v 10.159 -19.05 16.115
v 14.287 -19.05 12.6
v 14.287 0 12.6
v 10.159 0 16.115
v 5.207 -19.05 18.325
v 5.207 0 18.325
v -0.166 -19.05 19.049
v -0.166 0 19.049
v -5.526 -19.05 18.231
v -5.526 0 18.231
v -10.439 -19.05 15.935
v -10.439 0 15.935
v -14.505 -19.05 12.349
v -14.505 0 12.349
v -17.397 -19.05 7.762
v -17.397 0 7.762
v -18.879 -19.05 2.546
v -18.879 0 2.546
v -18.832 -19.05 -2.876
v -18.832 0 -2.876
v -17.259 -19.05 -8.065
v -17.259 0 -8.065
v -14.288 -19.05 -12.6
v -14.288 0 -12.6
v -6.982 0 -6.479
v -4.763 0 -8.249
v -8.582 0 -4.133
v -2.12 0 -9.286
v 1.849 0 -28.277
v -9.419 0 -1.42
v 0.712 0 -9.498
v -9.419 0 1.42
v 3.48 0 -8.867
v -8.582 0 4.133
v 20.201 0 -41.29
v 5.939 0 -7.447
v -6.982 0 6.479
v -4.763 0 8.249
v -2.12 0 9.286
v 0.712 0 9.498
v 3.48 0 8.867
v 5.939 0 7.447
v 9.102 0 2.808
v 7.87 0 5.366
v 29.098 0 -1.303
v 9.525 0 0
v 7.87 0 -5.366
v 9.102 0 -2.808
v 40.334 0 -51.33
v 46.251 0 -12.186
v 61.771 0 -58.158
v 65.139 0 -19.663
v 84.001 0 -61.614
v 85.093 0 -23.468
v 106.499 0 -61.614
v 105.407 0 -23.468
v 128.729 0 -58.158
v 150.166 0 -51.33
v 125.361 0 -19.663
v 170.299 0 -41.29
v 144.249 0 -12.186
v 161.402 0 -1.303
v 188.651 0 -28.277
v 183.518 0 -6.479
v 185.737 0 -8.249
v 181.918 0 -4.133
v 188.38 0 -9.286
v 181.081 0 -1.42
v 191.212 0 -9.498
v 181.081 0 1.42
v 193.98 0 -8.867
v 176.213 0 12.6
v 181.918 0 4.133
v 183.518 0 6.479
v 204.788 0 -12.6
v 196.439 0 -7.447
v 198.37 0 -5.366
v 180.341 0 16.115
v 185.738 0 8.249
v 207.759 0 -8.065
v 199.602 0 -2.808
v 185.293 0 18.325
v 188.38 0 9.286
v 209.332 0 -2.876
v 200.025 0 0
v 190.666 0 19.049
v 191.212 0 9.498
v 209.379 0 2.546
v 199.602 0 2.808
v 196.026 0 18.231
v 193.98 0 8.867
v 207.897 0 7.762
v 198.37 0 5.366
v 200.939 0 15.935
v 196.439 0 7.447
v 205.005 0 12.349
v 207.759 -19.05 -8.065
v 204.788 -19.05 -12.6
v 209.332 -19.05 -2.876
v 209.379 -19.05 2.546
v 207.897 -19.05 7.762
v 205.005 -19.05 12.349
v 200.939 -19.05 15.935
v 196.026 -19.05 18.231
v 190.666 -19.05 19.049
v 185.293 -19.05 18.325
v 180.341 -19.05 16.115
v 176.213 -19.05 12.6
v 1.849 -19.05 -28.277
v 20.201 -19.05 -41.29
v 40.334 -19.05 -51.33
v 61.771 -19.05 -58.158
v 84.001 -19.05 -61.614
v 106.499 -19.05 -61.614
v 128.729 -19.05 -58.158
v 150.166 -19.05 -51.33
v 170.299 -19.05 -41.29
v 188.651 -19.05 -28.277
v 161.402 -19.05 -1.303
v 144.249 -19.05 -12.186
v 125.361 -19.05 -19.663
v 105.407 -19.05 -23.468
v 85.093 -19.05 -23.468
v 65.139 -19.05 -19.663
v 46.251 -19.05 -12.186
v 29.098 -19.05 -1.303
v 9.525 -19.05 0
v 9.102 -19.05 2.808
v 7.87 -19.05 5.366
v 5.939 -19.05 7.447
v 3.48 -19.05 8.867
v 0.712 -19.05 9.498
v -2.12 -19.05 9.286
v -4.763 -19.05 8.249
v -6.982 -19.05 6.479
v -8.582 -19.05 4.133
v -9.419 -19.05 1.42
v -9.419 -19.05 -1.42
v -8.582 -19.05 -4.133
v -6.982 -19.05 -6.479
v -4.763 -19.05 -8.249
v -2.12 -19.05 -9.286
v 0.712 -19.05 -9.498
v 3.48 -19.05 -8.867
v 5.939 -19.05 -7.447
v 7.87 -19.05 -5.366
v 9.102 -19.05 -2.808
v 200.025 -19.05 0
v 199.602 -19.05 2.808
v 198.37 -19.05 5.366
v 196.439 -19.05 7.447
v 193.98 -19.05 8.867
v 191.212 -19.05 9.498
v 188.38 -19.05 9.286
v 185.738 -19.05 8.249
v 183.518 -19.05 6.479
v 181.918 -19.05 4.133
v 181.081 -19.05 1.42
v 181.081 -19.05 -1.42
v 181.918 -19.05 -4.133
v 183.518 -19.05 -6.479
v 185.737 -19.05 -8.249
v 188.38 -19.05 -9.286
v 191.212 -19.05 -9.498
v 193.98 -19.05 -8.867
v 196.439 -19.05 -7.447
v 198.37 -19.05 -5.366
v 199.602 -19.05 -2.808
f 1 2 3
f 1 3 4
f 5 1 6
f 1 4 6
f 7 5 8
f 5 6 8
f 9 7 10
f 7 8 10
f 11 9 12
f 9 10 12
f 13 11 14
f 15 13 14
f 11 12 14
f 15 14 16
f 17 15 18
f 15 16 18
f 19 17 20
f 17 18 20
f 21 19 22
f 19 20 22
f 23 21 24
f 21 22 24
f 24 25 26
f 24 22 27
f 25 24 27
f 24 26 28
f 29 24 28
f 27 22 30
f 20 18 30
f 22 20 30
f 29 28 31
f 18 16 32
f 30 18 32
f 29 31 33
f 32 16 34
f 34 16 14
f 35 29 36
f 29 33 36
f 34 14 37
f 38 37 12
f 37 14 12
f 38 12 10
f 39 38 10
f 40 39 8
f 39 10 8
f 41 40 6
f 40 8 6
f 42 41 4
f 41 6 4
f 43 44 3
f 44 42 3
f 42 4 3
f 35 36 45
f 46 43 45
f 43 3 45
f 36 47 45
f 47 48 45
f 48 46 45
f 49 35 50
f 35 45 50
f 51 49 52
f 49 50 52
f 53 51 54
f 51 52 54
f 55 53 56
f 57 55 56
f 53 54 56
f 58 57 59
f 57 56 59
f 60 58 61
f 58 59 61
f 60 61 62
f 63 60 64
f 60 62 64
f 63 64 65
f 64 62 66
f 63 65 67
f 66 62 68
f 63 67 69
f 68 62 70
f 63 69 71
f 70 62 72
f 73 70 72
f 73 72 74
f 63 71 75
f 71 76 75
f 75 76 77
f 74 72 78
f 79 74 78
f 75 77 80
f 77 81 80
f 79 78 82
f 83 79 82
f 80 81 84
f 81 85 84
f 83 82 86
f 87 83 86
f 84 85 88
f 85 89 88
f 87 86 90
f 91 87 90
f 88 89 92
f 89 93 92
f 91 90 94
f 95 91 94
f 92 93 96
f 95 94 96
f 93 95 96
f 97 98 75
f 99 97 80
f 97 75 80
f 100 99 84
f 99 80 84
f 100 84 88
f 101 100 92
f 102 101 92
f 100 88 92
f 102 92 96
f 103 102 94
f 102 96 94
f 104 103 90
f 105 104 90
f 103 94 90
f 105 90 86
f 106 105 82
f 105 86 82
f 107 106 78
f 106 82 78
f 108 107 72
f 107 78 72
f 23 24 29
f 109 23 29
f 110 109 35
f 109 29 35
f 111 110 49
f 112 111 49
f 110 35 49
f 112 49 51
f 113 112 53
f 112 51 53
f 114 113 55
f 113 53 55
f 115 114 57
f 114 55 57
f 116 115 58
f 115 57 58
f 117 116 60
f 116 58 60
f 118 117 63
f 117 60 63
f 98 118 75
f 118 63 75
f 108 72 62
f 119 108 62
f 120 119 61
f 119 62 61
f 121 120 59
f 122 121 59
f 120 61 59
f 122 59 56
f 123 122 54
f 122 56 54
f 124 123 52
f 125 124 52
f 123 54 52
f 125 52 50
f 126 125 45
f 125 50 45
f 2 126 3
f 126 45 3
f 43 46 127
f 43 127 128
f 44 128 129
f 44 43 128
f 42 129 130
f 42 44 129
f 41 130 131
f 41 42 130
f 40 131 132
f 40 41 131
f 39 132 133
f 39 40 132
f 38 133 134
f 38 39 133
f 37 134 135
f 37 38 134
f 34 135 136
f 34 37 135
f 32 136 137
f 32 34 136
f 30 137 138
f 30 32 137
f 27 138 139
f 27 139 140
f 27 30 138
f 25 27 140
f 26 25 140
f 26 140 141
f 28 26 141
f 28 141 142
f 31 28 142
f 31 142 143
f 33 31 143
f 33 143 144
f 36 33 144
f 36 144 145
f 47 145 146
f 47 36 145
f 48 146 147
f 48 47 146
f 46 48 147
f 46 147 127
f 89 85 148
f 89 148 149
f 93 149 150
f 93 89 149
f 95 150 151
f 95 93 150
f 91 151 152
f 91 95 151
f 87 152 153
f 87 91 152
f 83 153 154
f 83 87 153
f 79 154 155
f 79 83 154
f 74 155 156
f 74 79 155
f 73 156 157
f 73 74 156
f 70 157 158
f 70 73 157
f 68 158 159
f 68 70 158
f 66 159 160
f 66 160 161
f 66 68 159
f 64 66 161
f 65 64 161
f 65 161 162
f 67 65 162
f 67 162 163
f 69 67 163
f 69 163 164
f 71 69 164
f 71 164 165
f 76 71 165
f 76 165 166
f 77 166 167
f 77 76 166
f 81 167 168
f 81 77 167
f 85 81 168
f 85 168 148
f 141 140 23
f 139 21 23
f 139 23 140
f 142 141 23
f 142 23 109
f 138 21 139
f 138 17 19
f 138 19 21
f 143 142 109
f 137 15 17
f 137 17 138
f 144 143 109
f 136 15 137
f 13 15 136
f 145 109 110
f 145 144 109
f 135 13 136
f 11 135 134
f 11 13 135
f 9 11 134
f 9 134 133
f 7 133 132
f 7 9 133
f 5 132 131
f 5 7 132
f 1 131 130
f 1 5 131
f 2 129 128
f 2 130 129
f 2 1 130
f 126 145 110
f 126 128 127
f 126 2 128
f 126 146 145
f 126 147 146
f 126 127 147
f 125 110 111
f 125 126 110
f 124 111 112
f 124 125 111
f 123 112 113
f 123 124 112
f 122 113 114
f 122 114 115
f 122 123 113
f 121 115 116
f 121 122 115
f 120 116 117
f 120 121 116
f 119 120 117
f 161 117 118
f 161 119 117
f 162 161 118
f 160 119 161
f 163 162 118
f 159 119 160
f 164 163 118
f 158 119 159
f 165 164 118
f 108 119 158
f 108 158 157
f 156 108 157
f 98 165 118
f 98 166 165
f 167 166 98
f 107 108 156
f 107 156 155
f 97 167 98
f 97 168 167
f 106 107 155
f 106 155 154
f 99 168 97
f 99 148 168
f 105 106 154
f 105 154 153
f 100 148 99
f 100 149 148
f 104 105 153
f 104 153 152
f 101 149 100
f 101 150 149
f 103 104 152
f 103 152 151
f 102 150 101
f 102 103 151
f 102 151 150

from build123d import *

# Parameters (mm, degrees)
F0_R     = 9.525
F1_DEPTH = 19.05


with BuildPart() as f1:
    # F0 (on Front) → F1 (new body)
    with BuildSketch(Plane.XZ):
        with BuildLine():
            ThreePointArc((14.2875, 12.600391), (-12.600391, 14.2875), (-14.2875, -12.600391))
            ThreePointArc((-14.2875, -12.600391), (95.25, -62.047396), (204.7875, -12.600391))
            ThreePointArc((204.7875, -12.600391), (203.100391, 14.2875), (176.2125, 12.600391))
            ThreePointArc((176.2125, 12.600391), (95.25, -23.947396), (14.2875, 12.600391))
        make_face()
        Circle(F0_R, mode=Mode.SUBTRACT)
        with Locations((190.5, 0)):
            Circle(F0_R, mode=Mode.SUBTRACT)
    extrude(amount=F1_DEPTH)


solid = f1.part
